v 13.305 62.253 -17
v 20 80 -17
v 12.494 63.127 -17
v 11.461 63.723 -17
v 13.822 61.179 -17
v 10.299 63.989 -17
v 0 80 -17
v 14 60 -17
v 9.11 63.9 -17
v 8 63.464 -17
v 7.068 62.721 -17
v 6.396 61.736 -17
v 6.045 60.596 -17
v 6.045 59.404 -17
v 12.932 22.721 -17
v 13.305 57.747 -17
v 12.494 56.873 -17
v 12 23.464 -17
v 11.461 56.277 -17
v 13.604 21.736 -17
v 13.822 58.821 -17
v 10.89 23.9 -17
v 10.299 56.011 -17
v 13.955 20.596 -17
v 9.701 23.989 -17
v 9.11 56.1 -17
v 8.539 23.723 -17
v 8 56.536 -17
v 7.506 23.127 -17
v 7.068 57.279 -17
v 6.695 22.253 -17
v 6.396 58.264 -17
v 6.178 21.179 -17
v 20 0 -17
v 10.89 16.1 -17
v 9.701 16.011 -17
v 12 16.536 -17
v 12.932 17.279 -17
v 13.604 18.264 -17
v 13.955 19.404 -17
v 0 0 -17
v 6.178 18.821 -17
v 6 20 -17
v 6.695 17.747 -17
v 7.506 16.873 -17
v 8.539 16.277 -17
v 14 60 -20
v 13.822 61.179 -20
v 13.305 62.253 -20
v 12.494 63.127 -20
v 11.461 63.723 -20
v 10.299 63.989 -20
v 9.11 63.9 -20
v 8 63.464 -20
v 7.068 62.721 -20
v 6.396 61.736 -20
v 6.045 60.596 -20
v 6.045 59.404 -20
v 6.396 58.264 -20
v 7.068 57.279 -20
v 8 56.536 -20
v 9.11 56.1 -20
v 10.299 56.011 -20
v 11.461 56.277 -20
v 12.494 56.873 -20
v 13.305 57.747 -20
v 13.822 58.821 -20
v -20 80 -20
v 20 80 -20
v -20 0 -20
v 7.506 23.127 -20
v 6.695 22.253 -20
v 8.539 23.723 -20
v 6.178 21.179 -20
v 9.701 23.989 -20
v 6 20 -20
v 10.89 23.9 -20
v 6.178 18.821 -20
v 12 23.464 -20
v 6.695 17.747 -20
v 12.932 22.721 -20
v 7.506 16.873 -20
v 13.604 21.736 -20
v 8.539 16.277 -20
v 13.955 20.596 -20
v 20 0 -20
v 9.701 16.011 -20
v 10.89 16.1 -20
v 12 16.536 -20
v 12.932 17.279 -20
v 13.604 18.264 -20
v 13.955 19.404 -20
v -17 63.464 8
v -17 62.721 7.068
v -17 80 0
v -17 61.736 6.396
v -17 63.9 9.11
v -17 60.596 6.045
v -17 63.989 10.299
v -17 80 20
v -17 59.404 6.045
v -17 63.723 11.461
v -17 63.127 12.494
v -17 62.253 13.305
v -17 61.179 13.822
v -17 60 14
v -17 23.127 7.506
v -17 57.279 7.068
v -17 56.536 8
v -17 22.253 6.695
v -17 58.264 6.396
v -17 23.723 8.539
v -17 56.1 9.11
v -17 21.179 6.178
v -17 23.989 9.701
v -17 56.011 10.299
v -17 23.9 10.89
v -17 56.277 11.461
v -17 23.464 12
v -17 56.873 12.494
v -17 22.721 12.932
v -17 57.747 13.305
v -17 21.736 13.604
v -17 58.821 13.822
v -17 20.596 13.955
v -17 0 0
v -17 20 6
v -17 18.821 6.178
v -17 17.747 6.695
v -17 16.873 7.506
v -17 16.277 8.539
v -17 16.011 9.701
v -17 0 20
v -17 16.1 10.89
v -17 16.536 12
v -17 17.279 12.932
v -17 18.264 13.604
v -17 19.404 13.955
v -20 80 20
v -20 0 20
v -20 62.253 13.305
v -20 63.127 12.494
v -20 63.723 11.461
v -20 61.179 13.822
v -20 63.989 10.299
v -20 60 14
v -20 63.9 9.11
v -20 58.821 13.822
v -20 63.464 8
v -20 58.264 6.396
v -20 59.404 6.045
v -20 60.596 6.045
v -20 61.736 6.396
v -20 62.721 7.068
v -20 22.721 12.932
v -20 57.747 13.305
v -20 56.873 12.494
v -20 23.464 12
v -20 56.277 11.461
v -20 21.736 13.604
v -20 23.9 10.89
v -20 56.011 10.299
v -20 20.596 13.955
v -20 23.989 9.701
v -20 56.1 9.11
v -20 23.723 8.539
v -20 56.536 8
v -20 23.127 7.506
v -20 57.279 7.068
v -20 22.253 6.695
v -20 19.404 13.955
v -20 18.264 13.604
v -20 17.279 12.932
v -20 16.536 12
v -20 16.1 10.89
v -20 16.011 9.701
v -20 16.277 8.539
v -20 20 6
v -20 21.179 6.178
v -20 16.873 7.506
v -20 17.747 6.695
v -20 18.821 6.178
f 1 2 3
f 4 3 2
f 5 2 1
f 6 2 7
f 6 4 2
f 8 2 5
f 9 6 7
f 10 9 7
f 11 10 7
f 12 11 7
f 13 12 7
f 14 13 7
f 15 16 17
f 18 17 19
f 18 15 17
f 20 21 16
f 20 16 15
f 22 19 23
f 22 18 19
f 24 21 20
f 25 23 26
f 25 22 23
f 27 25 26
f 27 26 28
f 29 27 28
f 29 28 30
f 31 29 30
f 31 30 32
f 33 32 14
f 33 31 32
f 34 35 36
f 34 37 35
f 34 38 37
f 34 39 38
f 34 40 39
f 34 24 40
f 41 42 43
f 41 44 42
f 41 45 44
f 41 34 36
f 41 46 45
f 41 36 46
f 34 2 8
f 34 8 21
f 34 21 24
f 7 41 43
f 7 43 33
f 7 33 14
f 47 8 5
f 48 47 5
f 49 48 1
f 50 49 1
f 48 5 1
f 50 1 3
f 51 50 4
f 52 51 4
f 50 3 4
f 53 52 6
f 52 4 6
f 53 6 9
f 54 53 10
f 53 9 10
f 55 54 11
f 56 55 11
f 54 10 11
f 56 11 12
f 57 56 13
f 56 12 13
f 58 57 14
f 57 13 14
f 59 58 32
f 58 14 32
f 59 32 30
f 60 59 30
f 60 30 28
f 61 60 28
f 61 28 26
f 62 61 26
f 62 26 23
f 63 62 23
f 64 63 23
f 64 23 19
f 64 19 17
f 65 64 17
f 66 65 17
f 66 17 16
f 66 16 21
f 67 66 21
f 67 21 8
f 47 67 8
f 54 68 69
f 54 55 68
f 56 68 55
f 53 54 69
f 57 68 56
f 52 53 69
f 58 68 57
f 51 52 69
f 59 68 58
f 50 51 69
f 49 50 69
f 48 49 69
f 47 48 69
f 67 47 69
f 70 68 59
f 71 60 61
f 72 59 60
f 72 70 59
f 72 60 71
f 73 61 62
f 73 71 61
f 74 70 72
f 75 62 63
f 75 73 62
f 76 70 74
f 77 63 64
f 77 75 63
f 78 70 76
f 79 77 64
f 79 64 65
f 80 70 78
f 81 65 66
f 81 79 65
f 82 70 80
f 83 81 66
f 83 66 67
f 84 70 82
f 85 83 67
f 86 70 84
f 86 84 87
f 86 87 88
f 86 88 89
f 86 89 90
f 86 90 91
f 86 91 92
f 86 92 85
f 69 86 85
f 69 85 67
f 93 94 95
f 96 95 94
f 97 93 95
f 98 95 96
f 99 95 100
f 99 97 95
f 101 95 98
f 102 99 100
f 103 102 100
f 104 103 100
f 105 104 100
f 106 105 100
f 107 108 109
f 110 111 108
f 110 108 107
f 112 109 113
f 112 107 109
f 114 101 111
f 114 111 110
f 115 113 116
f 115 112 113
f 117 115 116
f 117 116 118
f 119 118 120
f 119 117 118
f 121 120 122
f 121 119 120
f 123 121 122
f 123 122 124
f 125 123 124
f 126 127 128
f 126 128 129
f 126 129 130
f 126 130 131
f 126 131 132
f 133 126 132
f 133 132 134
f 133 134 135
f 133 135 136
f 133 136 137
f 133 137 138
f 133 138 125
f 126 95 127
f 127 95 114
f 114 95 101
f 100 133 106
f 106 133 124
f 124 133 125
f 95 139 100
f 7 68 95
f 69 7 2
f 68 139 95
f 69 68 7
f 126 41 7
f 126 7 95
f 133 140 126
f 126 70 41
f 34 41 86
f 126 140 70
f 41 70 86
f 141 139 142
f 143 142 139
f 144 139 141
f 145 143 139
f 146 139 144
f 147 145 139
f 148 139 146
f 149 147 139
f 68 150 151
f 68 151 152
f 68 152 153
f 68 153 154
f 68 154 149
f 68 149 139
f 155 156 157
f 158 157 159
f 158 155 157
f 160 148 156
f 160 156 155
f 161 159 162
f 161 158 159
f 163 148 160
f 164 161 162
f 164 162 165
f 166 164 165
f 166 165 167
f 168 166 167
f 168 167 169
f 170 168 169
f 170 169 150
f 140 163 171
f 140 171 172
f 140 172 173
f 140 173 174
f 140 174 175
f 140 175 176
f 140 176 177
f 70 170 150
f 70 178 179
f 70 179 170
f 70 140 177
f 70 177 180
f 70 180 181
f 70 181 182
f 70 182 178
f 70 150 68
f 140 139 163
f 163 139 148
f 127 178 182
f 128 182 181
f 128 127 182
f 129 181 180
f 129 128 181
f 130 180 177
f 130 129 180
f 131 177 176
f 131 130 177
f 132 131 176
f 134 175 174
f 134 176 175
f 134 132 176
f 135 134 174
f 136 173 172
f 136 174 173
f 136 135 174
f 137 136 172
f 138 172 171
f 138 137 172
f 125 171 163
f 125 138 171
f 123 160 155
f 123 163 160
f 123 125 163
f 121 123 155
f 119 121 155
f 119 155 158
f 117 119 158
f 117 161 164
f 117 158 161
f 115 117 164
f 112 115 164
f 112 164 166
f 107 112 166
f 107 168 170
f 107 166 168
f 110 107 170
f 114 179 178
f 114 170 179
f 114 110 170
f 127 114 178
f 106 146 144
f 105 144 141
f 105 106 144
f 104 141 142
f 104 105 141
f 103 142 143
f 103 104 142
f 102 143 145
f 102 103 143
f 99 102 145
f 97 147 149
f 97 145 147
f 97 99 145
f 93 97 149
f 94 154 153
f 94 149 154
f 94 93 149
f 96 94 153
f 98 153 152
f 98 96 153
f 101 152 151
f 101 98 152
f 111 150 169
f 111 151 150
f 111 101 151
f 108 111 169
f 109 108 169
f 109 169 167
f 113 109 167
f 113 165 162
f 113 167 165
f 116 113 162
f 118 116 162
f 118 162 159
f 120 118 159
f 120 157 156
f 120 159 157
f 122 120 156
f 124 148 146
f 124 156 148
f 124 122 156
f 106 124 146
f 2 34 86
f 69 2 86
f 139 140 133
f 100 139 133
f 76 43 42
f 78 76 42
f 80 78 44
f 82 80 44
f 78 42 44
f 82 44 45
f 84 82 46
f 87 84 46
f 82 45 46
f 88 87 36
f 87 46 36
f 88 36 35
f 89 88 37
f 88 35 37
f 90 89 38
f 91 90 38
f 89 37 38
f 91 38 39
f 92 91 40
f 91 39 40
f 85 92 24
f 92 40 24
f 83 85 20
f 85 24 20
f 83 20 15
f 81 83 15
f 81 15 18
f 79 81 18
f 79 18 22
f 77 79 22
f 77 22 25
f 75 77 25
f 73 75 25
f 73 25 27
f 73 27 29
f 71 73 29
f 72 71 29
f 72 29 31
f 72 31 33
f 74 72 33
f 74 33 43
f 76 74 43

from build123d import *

# Parameters (mm, degrees)
SZKIC1_W                        = 40
SZKIC1_H                        = 40
DODANIE_WYCI_GNI_CIE1_DEPTH     = 80
WYTNIJ_WYCI_GNI_CIE2_DEPTH      = 85.852813742
WYTNIJ_WYCI_GNI_CIE2_DEPTH_BACK = 80
SZKIC3_R                        = 4
WYTNIJ_WYCI_GNI_CIE3_DEPTH      = 91.382520434


with BuildPart() as part:
    # Szkic1 → Dodanie-wyciągnięcie1 (new body)
    with BuildSketch(Plane(origin=(0, 0, 0), x_dir=(1, 0, 0), z_dir=(0, 1, 0))):
        Rectangle(SZKIC1_W, SZKIC1_H)
    extrude(amount=DODANIE_WYCI_GNI_CIE1_DEPTH)

    # Szkic2 → Wytnij-wyciągnięcie2 (cut, two sides: drawn at the far end of the back side and taken through both)
    with BuildSketch(Plane(origin=(0, 80, 0), x_dir=(1, 0, 0), z_dir=(0, 1, 0)).offset(-WYTNIJ_WYCI_GNI_CIE2_DEPTH_BACK)):
        Polygon((-17, 0), (-17, -20), (20, -20), (20, 17), (0, 17), align=None)
    extrude(amount=WYTNIJ_WYCI_GNI_CIE2_DEPTH + WYTNIJ_WYCI_GNI_CIE2_DEPTH_BACK, mode=Mode.SUBTRACT)

    # Szkic3 → Wytnij-wyciągnięcie3 (cut, through all)
    with BuildSketch(Plane.XY.offset(-17)):
        with Locations((10, 60)):
            Circle(SZKIC3_R)
        with Locations(Location((10, 20, 0), (0, 0, 180))):
            Circle(SZKIC3_R)
    wytnij_wyci_gni_cie3 = extrude(amount=-WYTNIJ_WYCI_GNI_CIE3_DEPTH, mode=Mode.SUBTRACT)

    # Lustro1: Wytnij-wyciągnięcie3 across plane
    add(wytnij_wyci_gni_cie3.mirror(Plane(origin=(0, 0, 0), x_dir=(0.7071067811865476, 0, 0.7071067811865475), z_dir=(-0.7071067811865475, 0, 0.7071067811865476))), mode=Mode.SUBTRACT)


solid = part.part
